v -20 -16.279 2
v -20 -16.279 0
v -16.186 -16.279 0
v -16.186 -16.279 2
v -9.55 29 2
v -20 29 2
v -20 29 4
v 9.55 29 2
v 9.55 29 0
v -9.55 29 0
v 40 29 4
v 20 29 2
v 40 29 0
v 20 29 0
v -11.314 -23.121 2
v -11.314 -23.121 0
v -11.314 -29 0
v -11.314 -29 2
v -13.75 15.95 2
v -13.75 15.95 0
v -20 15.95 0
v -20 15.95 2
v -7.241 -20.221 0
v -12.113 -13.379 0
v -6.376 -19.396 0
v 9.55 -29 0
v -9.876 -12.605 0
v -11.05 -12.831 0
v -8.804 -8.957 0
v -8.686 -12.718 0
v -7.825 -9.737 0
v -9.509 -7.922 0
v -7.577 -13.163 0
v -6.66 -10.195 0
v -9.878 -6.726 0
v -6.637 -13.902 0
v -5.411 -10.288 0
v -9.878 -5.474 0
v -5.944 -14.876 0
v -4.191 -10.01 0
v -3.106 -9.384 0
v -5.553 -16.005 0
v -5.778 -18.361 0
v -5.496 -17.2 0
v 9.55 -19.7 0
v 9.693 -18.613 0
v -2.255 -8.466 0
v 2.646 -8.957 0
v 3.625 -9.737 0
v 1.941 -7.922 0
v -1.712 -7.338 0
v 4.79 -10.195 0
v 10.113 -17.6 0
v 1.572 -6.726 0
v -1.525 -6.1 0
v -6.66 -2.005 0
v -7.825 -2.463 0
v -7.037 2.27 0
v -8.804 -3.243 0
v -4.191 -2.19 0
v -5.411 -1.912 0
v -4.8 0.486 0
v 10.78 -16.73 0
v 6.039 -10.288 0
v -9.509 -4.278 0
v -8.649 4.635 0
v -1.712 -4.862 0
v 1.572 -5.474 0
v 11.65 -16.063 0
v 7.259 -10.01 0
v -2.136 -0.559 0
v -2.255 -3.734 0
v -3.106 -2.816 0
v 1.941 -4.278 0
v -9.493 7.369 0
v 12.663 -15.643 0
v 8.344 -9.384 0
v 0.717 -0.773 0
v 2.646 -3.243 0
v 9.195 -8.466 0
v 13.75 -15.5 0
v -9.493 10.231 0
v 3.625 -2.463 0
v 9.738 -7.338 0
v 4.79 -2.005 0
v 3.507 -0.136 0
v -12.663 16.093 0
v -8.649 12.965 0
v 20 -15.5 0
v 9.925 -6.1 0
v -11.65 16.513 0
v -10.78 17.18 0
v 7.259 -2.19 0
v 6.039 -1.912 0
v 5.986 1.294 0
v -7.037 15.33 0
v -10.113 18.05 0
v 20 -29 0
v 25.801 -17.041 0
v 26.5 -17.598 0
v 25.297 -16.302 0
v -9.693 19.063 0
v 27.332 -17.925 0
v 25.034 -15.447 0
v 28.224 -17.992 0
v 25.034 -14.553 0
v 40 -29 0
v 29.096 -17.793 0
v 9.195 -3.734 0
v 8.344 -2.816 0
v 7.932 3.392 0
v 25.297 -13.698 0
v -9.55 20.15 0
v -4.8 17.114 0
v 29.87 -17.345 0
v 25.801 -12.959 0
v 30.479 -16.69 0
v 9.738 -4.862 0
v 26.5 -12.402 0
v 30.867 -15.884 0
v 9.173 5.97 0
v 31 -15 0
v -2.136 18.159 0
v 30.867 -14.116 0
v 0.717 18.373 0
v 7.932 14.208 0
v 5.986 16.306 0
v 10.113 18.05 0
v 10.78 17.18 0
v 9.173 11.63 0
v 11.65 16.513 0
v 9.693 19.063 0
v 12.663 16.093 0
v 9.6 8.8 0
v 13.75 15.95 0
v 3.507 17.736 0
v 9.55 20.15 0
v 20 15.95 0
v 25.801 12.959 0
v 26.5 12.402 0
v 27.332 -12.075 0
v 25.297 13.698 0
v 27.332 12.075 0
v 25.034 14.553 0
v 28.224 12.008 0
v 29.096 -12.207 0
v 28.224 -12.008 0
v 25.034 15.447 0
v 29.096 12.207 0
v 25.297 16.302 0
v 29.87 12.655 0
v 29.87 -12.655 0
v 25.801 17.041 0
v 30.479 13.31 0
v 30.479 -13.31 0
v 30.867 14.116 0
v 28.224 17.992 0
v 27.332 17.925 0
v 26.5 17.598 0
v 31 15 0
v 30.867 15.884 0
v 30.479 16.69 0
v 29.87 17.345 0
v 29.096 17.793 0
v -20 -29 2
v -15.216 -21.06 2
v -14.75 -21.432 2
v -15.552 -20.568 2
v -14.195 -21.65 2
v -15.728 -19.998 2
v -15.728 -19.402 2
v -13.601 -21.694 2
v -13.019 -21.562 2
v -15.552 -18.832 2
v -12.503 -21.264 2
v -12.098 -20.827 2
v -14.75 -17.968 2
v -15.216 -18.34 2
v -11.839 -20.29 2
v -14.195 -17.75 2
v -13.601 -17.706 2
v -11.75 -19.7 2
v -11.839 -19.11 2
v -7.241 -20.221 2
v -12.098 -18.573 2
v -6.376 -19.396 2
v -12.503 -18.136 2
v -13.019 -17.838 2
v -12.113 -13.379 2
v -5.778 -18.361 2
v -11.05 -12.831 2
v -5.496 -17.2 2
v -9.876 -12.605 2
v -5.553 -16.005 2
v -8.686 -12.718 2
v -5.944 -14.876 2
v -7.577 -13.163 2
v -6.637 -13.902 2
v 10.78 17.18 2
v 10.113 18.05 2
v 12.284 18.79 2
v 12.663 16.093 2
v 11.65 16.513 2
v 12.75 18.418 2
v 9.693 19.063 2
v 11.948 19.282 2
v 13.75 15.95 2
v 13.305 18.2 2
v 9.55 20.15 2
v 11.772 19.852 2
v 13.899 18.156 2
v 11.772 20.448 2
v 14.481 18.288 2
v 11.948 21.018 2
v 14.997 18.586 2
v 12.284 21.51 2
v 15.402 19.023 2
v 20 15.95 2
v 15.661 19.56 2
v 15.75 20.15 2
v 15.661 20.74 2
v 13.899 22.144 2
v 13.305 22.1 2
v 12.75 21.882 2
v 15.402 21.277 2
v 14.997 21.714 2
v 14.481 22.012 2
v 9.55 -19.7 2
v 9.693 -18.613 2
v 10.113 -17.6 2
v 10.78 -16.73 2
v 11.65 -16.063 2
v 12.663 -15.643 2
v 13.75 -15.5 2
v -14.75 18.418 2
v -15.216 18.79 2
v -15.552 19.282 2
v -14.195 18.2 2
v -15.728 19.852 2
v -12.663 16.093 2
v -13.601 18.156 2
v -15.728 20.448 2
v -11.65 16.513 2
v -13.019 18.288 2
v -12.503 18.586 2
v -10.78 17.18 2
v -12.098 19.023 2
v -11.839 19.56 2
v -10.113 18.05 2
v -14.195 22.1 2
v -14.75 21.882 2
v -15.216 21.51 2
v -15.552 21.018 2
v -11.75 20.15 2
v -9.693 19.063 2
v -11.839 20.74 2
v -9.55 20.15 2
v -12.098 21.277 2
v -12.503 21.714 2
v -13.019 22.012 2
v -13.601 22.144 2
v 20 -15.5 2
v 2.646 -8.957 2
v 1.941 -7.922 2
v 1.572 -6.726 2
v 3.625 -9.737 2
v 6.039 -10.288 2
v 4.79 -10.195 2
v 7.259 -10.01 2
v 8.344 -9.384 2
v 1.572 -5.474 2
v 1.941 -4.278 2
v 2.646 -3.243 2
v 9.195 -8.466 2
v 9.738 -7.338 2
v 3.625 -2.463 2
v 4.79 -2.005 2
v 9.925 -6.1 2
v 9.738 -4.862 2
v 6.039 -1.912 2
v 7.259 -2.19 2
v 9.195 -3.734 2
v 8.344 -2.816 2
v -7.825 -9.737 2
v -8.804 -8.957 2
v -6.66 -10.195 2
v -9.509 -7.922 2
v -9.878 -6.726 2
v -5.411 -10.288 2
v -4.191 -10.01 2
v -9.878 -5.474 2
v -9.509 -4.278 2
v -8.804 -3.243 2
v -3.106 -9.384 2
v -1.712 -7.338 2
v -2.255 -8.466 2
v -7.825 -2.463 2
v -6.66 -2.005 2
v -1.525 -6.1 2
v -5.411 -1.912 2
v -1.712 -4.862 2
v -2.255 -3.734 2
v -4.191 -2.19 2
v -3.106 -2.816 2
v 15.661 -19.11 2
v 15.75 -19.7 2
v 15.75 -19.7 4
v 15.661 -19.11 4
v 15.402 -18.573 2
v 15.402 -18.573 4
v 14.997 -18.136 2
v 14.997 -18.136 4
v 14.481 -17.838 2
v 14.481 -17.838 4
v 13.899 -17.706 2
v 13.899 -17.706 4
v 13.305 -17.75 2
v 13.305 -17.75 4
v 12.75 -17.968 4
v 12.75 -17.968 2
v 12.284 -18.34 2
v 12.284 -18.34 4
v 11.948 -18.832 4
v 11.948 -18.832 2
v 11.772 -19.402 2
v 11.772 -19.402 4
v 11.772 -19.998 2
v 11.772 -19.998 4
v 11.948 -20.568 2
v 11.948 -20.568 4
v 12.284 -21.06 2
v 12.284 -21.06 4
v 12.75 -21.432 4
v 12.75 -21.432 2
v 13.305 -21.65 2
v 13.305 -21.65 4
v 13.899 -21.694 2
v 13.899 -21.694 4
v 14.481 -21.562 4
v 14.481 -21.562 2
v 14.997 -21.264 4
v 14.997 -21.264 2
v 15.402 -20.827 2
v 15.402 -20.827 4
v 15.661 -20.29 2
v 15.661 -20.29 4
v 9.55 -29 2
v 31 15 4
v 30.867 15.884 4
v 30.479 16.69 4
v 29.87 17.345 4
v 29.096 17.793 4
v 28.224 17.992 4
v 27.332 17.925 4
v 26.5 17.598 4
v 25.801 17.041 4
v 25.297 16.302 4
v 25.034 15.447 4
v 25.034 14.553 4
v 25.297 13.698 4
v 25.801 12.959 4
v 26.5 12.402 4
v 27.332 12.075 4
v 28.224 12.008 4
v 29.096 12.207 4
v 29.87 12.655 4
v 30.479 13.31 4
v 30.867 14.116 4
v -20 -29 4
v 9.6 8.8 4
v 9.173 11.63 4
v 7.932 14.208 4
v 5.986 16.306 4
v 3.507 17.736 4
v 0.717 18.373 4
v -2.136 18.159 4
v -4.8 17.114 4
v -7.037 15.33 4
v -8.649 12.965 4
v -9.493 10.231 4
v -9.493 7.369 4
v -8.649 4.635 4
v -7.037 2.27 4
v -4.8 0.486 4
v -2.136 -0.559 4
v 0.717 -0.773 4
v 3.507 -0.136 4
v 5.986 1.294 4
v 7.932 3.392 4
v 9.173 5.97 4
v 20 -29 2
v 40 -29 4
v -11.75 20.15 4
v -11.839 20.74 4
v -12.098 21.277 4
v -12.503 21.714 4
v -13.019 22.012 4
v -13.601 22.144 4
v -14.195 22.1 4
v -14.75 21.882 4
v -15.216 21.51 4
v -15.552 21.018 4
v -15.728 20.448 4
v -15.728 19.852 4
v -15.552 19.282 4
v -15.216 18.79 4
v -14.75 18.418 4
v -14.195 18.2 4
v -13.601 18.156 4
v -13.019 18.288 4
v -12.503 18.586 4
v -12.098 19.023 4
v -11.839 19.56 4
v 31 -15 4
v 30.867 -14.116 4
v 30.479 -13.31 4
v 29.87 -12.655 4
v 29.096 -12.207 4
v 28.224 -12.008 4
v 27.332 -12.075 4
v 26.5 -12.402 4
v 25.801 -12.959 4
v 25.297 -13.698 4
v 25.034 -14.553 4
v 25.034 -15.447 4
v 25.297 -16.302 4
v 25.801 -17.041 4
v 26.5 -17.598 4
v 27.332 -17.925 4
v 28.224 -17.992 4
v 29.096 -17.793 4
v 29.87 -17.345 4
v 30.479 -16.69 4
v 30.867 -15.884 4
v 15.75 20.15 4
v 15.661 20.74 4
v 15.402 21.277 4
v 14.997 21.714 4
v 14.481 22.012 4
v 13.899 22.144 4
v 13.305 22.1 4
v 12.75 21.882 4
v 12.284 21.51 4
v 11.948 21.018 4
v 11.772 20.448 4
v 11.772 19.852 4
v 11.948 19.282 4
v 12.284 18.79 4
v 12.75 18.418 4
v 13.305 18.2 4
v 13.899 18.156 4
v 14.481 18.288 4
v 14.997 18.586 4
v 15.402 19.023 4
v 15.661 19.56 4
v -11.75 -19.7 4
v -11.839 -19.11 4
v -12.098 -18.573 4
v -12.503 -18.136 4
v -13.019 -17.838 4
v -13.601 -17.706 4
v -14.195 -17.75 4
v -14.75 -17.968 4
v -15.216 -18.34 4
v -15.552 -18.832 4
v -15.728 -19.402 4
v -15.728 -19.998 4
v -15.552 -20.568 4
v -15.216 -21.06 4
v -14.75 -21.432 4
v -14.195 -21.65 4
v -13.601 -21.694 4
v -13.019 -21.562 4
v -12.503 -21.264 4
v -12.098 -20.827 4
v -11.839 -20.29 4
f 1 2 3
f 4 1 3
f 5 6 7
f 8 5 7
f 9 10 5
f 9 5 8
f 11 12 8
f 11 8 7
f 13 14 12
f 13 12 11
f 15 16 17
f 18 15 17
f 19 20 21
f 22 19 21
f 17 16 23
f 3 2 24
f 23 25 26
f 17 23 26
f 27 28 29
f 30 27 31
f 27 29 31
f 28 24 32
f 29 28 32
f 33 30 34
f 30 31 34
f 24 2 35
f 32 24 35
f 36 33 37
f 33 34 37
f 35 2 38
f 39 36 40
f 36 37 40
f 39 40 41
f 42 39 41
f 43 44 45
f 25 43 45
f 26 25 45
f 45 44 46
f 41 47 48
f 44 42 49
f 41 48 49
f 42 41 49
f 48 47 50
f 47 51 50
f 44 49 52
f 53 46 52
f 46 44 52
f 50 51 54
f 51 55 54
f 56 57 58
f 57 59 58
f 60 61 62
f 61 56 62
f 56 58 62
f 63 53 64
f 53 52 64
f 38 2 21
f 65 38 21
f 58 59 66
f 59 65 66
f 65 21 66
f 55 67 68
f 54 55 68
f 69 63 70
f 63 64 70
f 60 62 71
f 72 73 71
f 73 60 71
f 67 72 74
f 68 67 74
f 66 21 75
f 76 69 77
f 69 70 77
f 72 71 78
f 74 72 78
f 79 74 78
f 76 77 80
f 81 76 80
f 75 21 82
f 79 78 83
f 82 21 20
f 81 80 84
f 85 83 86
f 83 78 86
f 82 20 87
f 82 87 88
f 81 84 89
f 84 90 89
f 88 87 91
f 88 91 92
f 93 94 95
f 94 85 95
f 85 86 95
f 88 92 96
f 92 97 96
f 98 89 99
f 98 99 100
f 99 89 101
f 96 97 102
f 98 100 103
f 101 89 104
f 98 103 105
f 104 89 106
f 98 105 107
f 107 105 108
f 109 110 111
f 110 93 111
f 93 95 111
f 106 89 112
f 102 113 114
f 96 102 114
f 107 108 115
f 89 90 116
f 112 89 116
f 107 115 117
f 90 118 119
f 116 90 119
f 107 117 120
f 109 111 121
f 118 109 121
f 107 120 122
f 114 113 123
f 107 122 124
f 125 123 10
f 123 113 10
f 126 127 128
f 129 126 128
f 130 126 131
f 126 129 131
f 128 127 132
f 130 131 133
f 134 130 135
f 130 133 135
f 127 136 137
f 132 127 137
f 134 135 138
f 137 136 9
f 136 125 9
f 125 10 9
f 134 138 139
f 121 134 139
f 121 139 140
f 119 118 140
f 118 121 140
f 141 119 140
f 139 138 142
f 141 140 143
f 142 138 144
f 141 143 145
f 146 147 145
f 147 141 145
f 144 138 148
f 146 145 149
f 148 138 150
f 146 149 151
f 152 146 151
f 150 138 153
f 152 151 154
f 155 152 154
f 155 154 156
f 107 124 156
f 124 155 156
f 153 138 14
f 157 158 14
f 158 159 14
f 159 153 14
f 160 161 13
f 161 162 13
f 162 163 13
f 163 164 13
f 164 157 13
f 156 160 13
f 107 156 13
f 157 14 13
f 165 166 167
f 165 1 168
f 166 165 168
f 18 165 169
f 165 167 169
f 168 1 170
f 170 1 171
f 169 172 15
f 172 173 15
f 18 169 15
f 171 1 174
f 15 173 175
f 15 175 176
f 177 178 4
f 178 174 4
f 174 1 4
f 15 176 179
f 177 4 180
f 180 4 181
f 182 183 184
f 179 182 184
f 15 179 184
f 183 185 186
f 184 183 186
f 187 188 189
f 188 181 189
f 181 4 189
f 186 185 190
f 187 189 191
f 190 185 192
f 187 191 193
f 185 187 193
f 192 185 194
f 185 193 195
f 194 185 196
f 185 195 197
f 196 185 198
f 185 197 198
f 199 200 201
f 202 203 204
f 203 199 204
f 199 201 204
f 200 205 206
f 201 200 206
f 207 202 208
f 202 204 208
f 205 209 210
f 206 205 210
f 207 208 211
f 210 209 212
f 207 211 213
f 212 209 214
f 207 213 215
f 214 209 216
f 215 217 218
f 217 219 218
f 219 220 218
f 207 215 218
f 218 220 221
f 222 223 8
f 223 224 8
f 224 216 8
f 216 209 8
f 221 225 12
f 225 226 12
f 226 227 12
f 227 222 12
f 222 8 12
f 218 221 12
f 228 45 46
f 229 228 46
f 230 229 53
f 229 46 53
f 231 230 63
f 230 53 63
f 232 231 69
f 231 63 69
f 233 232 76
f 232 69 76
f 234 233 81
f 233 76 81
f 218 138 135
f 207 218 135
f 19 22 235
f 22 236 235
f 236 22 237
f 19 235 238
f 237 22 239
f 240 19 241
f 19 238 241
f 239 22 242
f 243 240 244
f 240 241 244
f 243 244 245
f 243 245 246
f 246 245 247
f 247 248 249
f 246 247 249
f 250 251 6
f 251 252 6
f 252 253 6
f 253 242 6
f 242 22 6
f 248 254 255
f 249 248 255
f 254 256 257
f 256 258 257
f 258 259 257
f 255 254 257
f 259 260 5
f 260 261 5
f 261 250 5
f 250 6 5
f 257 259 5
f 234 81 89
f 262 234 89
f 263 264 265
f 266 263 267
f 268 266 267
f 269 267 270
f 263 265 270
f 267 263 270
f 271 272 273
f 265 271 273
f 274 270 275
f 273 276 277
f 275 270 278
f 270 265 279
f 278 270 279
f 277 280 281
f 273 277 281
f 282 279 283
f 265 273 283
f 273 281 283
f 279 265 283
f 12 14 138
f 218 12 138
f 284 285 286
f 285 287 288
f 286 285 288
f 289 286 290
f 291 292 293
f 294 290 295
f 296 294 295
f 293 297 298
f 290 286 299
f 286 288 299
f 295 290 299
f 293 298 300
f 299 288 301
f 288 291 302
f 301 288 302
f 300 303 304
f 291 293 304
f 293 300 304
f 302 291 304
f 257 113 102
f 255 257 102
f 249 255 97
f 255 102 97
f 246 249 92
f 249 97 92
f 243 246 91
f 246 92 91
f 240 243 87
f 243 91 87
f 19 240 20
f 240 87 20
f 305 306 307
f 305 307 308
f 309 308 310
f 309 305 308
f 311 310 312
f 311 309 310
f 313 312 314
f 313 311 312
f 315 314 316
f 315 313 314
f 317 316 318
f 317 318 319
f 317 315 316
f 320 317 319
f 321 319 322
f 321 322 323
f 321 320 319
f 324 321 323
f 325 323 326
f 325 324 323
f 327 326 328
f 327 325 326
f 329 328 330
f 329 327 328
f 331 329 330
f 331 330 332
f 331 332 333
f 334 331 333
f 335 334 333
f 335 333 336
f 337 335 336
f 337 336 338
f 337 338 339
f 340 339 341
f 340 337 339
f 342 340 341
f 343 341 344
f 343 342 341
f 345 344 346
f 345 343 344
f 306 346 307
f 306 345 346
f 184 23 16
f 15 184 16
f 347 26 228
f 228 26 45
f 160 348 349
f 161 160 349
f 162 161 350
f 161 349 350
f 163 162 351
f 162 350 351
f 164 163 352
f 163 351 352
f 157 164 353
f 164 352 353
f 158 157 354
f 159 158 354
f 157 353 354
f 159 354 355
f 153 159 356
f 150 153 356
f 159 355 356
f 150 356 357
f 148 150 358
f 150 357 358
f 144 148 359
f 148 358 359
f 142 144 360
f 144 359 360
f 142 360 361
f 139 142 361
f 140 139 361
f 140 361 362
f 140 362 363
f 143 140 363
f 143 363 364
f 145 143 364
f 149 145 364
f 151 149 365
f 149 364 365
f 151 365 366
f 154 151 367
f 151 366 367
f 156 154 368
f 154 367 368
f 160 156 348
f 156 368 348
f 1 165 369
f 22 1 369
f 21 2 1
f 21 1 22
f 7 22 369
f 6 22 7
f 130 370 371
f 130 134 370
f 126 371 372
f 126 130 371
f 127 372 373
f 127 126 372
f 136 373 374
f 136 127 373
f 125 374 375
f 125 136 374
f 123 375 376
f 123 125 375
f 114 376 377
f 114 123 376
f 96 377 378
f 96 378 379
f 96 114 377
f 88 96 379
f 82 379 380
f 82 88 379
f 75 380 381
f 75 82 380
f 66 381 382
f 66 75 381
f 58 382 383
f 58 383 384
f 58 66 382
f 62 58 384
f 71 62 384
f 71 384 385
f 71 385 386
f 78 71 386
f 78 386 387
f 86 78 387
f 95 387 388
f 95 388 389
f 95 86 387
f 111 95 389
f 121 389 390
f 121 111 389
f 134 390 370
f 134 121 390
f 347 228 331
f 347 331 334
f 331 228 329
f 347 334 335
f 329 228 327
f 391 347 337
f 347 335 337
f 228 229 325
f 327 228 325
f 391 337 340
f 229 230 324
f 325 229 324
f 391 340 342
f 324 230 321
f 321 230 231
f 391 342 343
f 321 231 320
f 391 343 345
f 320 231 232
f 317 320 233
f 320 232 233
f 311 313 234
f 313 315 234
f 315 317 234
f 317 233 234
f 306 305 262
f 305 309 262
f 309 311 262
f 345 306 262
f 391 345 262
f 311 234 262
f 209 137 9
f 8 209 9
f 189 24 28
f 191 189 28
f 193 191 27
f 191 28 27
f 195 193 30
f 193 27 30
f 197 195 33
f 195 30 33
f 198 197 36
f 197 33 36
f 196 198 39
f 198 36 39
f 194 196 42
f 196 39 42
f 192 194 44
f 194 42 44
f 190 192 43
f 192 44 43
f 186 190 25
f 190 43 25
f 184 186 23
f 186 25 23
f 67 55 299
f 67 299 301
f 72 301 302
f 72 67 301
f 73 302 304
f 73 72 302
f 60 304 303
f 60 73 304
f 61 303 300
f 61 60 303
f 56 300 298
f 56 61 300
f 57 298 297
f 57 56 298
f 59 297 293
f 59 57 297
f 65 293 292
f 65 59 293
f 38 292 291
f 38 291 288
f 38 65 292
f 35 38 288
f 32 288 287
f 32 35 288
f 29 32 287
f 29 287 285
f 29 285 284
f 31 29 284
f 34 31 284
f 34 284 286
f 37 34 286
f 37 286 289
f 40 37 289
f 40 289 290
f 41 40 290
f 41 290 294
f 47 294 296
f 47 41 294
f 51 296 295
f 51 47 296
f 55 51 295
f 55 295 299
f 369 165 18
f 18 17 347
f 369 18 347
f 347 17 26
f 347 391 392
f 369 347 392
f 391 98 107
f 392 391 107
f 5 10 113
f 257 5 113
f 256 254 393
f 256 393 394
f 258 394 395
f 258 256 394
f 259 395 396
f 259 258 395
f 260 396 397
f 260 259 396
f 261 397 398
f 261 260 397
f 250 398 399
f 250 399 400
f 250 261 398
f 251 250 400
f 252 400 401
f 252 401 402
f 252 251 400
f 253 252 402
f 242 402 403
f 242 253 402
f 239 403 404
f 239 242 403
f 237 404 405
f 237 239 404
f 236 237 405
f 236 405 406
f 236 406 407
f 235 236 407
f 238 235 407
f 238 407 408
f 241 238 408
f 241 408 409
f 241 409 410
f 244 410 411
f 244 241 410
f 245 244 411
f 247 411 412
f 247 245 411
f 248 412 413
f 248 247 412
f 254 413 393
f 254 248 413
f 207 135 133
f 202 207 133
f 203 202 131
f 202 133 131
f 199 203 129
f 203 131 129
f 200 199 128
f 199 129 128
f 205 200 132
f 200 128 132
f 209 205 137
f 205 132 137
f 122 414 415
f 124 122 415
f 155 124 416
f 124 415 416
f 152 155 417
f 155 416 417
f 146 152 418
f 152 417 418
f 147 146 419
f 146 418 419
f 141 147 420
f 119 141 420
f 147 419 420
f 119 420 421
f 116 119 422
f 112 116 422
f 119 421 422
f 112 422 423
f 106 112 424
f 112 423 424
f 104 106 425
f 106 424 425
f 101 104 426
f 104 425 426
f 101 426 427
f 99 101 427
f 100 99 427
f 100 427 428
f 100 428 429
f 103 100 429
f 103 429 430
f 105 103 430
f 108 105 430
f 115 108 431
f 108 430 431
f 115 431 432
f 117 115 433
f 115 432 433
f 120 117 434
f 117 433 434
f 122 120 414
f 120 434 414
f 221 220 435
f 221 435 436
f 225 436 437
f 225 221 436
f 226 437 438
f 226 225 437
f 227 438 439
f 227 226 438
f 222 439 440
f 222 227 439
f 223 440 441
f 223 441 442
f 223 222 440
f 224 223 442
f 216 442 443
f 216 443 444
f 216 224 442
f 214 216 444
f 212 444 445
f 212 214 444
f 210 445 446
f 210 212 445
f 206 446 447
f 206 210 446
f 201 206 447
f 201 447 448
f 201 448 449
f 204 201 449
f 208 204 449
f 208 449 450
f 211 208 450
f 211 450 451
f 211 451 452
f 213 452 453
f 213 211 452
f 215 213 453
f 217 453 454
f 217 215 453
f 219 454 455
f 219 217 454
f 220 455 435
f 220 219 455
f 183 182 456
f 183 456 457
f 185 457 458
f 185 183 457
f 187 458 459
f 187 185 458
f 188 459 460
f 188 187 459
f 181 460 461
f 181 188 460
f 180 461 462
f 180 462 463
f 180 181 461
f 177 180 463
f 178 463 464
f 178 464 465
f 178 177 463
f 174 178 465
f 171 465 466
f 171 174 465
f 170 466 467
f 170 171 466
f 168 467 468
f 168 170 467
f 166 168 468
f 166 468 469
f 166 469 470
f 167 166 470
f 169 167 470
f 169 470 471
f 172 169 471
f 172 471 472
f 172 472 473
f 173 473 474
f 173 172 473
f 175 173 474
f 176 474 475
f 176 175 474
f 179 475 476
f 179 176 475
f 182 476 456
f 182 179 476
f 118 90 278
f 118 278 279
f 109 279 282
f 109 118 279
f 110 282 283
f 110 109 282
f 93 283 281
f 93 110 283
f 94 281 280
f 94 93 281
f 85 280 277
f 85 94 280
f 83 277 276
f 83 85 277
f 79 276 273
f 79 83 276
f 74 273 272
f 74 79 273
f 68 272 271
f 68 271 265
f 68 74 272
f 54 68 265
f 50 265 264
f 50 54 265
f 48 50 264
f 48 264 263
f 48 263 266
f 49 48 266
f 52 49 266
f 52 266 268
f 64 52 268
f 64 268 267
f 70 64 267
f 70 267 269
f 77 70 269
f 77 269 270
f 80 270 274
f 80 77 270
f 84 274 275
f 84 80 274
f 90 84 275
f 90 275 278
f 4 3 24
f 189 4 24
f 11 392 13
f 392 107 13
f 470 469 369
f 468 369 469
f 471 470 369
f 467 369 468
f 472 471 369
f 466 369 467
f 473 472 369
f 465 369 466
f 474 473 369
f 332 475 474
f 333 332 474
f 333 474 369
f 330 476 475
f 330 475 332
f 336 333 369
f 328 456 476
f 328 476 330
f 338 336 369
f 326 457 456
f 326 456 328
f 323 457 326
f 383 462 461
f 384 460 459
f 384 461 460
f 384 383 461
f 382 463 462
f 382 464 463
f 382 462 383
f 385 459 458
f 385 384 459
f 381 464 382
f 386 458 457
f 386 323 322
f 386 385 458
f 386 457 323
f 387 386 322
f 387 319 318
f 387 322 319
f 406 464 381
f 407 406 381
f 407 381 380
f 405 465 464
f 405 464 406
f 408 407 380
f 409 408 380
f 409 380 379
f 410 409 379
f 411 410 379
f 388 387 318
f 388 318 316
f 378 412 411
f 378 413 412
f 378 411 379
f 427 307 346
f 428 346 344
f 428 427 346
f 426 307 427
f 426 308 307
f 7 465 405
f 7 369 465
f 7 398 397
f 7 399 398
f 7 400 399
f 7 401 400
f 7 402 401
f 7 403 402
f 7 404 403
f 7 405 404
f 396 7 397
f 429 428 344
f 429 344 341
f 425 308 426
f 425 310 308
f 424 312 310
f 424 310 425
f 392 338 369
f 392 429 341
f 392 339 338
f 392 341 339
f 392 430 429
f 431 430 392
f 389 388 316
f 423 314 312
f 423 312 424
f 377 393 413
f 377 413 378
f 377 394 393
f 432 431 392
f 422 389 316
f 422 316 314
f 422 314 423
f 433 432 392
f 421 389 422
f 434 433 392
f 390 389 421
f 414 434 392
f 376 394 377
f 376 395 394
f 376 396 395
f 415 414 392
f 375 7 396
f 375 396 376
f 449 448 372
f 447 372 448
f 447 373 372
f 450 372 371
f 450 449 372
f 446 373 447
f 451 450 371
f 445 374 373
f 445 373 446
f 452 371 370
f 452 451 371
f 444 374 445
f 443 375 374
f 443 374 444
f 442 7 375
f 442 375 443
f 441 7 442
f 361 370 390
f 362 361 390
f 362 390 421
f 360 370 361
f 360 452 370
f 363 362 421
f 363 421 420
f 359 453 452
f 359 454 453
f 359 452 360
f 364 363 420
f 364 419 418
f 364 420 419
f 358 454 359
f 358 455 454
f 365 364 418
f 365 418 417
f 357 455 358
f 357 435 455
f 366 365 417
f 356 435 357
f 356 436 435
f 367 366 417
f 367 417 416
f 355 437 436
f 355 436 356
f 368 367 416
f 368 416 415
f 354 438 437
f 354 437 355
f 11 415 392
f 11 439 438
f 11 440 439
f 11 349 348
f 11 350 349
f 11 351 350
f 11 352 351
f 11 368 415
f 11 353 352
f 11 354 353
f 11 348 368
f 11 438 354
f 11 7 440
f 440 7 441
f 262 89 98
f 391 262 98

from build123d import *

# Parameters (mm, degrees)
SKETCH1_R           = 9.6
SKETCH1_R_2         = 4.2
BOSS_EXTRUDE1_DEPTH = 2
SKETCH4_W           = 60
SKETCH4_H           = 58
SKETCH4_R           = 2
SKETCH4_R_2         = 9.6
BOSS_EXTRUDE3_DEPTH = 2
SKETCH5_R           = 3
CUT_EXTRUDE1_DEPTH  = 4


with BuildPart() as part:
    # Sketch1 → Boss-Extrude1 (new body)
    with BuildSketch(Plane.XY):
        with BuildLine():
            Line((40, 29), (20, 29))
            Line((20, 29), (20, 15.95))
            Line((20, 15.95), (13.75, 15.95))
            ThreePointArc((13.75, 15.95), (10.780151519, 17.180151519), (9.55, 20.15))
            Line((9.55, 20.15), (9.55, 29))
            Line((9.55, 29), (-9.55, 29))
            Line((-9.55, 29), (-9.55, 20.15))
            ThreePointArc((-9.55, 20.15), (-10.780151519, 17.180151519), (-13.75, 15.95))
            Line((-13.75, 15.95), (-20, 15.95))
            Line((-20, 15.95), (-20, -16.278610808))
            Line((-20, -16.278610808), (-16.186, -16.278610808))
            Line((-16.186, -16.278610808), (-12.112917629, -13.378610808))
            ThreePointArc((-12.112917629, -13.378610808), (-6.255528438, -14.364), (-7.240917629, -20.221389192))
            Line((-7.240917629, -20.221389192), (-11.314, -23.121389192))
            Line((-11.314, -23.121389192), (-11.314, -29))
            Line((-11.314, -29), (9.55, -29))
            Line((9.55, -29), (9.55, -19.7))
            ThreePointArc((9.55, -19.7), (10.780151519, -16.730151519), (13.75, -15.5))
            Line((13.75, -15.5), (20, -15.5))
            Line((20, -15.5), (20, -29))
            Line((20, -29), (40, -29))
            Line((40, -29), (40, 29))
        make_face()
        with Locations((0, 8.8)):
            Circle(SKETCH1_R, mode=Mode.SUBTRACT)
        with Locations((-5.725, -6.1)):
            Circle(SKETCH1_R_2, mode=Mode.SUBTRACT)
        with Locations((5.725, -6.1)):
            Circle(SKETCH1_R_2, mode=Mode.SUBTRACT)
    extrude(amount=BOSS_EXTRUDE1_DEPTH)

    # Sketch4 → Boss-Extrude3 (add)
    with BuildSketch(Plane.XY.offset(2)):
        with Locations((10, 0)):
            Rectangle(SKETCH4_W, SKETCH4_H)
        with Locations((13.75, -19.7)):
            Circle(SKETCH4_R, mode=Mode.SUBTRACT)
        with Locations((-13.75, 20.15)):
            Circle(SKETCH4_R, mode=Mode.SUBTRACT)
        with Locations((13.75, 20.15)):
            Circle(SKETCH4_R, mode=Mode.SUBTRACT)
        with Locations((-13.75, -19.7)):
            Circle(SKETCH4_R, mode=Mode.SUBTRACT)
        with Locations((0, 8.8)):
            Circle(SKETCH4_R_2, mode=Mode.SUBTRACT)
    extrude(amount=BOSS_EXTRUDE3_DEPTH)

    # Sketch5 → Cut-Extrude1 (cut)
    with BuildSketch(Plane.XY.offset(4)):
        with Locations((28, 15)):
            Circle(SKETCH5_R)
        with Locations((28, -15)):
            Circle(SKETCH5_R)
    extrude(amount=-CUT_EXTRUDE1_DEPTH, mode=Mode.SUBTRACT)


solid = part.part
